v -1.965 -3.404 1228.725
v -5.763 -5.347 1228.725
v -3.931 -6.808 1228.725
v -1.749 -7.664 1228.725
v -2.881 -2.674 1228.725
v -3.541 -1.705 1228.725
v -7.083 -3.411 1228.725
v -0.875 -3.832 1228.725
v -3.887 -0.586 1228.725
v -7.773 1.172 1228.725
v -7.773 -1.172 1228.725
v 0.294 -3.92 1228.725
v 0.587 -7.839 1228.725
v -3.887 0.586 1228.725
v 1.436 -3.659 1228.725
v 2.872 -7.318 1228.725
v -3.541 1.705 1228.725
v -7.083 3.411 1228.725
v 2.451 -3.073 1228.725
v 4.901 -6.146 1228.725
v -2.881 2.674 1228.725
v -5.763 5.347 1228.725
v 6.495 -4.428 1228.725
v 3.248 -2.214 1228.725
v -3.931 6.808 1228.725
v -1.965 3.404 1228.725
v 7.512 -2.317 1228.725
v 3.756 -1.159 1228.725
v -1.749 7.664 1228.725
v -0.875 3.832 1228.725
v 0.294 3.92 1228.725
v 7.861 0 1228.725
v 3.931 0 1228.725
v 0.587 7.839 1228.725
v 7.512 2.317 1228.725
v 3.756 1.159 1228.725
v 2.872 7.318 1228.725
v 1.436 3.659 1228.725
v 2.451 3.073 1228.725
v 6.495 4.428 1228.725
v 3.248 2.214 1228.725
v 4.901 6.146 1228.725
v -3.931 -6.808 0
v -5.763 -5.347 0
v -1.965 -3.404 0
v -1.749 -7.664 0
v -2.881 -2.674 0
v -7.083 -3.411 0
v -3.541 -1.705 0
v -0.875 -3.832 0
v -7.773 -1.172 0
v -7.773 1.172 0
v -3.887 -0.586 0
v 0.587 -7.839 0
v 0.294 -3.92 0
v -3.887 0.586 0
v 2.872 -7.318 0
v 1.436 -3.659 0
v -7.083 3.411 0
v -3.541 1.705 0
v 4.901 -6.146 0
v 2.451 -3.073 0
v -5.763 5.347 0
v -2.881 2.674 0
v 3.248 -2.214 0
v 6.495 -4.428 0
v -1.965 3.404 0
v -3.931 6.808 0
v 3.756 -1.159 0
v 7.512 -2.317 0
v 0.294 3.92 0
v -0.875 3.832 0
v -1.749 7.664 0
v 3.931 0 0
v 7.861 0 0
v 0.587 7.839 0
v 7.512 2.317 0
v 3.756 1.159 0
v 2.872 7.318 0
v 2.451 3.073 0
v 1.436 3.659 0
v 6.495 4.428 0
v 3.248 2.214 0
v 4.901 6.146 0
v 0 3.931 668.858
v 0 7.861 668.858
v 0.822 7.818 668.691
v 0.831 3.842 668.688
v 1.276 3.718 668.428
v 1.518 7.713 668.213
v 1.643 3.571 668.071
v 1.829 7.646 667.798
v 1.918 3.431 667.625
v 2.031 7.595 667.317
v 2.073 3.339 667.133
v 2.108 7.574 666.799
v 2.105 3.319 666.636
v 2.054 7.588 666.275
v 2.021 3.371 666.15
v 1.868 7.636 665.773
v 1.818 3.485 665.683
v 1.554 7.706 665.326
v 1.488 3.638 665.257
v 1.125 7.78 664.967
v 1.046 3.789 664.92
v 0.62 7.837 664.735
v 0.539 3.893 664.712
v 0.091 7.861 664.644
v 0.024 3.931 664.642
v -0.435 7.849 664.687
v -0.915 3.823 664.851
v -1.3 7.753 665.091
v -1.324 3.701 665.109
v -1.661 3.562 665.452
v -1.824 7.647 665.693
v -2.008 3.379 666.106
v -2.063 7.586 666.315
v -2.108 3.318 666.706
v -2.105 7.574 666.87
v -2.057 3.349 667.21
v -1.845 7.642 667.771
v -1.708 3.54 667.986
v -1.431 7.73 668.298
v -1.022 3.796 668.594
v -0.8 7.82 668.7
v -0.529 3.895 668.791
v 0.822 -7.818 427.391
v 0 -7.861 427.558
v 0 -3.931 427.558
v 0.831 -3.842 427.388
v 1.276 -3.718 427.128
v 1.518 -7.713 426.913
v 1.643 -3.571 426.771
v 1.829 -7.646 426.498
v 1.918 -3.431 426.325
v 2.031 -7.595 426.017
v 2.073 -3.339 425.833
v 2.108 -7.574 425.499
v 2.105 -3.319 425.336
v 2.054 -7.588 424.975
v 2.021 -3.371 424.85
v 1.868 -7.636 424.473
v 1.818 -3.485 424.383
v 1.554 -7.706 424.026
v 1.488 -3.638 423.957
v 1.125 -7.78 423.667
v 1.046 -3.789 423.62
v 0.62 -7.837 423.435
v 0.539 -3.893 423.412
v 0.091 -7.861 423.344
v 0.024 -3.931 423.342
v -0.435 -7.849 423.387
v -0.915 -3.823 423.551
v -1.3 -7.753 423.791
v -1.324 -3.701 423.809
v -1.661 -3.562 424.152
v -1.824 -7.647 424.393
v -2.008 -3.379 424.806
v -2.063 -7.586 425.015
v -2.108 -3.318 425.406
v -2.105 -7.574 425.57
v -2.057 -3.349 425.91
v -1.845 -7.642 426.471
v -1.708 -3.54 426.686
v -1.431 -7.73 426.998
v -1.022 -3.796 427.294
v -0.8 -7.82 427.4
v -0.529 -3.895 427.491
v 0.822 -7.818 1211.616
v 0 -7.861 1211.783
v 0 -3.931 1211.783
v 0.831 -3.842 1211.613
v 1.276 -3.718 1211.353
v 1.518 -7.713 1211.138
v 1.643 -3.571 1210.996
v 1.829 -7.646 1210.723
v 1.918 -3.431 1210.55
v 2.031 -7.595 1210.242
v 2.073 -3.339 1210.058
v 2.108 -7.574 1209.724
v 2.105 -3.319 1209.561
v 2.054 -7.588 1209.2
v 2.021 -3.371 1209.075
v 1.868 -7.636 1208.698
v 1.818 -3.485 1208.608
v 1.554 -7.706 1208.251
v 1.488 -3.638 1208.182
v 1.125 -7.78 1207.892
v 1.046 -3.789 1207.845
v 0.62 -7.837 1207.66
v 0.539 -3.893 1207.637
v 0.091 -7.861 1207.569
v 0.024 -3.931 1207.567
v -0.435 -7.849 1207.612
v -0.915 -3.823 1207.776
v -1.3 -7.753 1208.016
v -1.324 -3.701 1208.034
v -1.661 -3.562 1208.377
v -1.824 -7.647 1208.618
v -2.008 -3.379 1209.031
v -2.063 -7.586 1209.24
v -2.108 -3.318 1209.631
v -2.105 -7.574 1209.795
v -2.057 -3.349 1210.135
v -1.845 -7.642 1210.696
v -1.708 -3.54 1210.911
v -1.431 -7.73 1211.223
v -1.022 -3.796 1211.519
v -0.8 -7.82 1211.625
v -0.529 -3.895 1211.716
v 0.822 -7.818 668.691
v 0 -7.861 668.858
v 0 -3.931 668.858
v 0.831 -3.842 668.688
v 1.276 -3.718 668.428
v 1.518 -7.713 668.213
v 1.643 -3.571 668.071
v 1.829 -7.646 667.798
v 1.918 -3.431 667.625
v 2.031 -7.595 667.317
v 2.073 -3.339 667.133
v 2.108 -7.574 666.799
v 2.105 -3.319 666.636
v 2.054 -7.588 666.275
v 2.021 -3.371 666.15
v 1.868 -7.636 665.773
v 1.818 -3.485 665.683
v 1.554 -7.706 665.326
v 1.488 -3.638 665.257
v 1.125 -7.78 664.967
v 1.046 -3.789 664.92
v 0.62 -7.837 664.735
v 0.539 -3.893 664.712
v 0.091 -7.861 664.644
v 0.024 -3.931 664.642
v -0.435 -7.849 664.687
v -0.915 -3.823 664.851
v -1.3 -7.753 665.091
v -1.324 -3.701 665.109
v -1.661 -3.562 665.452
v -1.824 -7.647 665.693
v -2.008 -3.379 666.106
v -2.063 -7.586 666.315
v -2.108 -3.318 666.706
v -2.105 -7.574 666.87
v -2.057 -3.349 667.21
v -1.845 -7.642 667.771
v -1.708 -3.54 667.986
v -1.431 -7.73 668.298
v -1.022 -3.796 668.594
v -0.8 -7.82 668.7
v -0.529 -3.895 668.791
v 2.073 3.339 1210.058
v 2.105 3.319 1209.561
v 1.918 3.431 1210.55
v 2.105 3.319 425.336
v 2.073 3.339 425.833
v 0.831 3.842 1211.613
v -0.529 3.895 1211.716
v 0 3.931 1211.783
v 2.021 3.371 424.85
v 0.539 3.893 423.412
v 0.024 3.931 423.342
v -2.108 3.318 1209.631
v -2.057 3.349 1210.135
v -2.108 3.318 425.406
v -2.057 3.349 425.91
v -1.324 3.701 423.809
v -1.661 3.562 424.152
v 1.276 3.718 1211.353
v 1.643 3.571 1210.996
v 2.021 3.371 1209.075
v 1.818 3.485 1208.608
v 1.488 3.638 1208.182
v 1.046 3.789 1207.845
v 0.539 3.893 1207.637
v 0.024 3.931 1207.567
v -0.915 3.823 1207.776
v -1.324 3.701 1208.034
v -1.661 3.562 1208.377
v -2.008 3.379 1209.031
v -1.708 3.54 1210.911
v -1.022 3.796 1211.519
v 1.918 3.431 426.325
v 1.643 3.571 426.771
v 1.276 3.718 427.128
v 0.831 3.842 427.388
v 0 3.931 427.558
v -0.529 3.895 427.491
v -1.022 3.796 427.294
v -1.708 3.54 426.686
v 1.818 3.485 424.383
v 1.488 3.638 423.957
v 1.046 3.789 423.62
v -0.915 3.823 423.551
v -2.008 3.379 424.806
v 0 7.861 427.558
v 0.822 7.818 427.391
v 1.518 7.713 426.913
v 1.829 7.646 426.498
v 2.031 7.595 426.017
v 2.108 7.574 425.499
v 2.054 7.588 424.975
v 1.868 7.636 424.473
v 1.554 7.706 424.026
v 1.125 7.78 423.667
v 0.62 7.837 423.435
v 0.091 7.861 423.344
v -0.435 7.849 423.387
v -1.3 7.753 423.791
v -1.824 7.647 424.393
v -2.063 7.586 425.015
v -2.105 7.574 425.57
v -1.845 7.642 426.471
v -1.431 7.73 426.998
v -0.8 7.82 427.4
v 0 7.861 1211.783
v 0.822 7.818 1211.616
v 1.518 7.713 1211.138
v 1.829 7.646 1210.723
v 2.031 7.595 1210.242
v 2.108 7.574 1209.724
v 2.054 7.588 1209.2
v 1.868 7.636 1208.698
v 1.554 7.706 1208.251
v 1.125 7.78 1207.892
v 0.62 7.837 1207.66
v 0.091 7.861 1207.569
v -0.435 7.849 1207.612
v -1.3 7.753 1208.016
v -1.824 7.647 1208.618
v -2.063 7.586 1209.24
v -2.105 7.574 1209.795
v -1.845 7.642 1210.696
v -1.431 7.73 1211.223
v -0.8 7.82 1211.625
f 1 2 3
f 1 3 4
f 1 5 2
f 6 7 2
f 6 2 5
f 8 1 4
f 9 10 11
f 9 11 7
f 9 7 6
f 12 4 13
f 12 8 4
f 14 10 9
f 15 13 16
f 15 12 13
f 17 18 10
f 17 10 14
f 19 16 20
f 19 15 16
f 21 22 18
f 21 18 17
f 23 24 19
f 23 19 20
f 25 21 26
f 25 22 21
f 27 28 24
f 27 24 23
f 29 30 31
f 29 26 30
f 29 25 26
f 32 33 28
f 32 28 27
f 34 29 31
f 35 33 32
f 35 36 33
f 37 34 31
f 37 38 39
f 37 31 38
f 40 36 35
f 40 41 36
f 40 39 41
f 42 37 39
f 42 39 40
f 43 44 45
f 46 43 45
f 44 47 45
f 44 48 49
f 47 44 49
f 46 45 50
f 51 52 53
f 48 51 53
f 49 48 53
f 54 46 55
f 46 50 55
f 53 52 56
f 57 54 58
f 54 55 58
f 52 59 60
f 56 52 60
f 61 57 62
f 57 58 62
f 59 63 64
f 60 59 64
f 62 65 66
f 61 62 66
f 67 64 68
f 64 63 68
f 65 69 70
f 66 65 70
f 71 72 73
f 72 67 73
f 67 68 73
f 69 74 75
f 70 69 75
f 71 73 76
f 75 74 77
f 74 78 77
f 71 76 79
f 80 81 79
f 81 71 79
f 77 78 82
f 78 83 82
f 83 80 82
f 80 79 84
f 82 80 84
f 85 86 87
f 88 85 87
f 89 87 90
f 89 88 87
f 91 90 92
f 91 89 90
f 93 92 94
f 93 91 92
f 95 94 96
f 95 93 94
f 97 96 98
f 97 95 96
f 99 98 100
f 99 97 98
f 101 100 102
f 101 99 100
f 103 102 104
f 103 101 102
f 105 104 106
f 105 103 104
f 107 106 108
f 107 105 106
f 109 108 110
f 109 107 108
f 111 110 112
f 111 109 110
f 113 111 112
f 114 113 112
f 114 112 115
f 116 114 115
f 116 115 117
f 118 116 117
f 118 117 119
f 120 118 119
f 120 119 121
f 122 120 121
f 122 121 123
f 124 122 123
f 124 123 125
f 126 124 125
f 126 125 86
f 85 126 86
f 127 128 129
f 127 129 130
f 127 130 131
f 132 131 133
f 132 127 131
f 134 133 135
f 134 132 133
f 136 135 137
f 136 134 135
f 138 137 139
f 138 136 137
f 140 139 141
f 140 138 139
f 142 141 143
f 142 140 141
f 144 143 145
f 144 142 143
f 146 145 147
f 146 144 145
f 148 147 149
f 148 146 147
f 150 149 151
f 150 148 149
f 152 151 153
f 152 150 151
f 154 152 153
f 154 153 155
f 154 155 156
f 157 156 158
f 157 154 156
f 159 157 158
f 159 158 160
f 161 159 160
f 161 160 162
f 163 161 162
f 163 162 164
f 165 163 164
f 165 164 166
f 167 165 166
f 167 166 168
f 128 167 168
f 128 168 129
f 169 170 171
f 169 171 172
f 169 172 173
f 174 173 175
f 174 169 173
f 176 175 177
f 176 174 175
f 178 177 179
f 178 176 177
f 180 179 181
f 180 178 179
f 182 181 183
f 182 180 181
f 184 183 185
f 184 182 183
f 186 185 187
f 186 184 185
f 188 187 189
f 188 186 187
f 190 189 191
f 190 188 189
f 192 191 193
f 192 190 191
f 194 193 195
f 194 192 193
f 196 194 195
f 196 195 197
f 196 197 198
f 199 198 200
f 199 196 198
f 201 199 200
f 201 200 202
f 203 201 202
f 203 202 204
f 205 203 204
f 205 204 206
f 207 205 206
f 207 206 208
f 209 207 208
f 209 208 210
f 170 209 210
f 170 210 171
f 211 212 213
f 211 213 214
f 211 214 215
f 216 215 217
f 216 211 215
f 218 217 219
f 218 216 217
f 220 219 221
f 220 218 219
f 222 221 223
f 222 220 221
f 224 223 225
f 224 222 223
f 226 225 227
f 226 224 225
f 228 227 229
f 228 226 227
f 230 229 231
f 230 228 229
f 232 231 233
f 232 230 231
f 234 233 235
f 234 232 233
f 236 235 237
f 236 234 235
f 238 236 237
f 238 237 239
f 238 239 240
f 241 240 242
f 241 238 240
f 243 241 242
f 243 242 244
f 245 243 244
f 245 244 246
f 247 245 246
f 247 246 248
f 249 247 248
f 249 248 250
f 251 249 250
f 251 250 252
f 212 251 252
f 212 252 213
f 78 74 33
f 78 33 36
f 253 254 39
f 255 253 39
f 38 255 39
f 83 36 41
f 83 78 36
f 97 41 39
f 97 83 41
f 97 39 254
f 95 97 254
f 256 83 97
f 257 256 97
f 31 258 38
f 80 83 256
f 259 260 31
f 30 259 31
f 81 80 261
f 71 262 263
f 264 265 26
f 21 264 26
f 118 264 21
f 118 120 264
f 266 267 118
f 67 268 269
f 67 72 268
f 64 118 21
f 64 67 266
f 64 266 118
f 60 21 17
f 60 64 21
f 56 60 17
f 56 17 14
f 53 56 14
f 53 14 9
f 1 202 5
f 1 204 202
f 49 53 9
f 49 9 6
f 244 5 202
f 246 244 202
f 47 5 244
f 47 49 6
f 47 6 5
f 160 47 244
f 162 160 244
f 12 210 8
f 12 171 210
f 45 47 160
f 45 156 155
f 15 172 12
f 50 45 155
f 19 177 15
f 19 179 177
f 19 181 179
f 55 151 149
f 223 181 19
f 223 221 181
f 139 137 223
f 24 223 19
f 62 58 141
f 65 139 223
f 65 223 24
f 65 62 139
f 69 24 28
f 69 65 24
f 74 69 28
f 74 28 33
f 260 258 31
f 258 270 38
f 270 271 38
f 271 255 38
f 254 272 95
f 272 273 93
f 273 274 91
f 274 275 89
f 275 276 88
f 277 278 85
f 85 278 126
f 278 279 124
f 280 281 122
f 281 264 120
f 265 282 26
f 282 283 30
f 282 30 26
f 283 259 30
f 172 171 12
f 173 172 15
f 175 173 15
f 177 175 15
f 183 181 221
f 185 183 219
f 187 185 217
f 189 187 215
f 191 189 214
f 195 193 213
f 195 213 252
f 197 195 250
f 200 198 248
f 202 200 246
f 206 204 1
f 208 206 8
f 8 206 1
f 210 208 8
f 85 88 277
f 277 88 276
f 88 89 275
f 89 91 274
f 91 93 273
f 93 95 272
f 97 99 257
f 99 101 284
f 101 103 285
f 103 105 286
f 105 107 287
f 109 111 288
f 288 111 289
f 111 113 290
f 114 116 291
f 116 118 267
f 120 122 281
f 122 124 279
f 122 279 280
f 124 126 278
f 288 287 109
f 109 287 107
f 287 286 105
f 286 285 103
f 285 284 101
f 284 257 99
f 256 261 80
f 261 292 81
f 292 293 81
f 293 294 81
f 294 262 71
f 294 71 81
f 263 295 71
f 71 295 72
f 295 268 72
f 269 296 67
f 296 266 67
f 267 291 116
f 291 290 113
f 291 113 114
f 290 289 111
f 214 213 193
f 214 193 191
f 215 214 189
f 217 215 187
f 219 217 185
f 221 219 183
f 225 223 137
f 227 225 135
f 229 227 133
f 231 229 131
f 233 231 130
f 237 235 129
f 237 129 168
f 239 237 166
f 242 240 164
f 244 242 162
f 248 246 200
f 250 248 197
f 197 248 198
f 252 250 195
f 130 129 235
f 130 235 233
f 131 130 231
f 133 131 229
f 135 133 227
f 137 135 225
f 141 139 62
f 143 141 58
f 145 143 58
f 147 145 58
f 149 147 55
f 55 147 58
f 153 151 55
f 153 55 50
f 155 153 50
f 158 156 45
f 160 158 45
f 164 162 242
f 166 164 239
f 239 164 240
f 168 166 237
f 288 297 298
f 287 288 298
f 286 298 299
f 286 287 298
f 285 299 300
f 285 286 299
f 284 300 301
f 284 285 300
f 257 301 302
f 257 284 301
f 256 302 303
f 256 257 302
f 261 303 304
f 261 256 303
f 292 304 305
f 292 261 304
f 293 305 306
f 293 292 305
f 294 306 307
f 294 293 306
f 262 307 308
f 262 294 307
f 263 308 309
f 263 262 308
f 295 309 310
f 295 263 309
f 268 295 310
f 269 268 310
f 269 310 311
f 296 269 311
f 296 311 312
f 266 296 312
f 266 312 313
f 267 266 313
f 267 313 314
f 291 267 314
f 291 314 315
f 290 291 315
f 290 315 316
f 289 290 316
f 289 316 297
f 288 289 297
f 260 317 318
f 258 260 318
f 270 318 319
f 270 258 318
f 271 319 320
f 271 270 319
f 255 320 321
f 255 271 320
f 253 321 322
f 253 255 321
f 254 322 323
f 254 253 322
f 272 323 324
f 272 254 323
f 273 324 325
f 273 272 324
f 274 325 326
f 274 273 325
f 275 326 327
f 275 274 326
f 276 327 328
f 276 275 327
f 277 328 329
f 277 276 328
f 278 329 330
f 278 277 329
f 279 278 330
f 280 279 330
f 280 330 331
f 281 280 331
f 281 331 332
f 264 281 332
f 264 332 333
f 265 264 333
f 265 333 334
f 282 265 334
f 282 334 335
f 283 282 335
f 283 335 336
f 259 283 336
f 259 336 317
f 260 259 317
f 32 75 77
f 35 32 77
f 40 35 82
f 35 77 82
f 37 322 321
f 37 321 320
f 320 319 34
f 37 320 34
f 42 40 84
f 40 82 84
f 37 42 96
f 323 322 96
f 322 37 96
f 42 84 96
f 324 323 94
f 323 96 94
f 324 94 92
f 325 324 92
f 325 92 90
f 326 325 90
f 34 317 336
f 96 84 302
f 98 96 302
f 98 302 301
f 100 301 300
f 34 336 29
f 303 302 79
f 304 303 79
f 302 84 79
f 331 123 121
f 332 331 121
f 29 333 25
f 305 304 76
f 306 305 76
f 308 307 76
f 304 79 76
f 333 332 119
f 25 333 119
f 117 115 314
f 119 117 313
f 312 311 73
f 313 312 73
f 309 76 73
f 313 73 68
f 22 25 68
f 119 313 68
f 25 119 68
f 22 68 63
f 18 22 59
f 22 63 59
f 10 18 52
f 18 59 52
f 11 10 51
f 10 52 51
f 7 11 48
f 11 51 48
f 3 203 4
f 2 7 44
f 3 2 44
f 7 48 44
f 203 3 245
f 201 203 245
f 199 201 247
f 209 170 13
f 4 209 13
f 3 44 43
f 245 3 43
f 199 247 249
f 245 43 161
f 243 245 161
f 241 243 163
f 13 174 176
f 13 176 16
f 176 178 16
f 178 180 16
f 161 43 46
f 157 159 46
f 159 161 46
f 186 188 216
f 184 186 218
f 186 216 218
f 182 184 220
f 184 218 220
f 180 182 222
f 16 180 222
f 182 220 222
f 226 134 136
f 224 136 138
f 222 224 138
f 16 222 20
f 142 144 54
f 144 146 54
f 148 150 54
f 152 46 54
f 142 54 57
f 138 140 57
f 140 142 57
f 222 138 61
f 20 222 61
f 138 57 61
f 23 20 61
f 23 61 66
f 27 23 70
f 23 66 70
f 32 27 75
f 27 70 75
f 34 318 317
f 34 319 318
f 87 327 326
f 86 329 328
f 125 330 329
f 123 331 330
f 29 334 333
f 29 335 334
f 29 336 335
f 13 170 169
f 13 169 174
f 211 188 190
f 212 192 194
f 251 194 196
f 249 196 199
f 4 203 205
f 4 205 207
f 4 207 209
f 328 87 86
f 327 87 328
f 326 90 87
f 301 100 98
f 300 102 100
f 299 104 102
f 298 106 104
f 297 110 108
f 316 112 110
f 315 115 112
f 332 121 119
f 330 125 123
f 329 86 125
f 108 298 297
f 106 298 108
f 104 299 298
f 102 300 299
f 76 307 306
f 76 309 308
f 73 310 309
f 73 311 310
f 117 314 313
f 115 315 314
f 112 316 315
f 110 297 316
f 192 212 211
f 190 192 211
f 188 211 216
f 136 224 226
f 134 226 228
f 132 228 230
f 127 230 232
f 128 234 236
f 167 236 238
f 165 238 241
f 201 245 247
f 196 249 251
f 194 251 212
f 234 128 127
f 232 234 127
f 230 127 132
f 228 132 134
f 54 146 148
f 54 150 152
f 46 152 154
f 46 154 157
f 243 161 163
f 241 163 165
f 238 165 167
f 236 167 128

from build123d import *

# Parameters (mm, degrees)
SKETCH1_R        = 7.8613
SKETCH1_R_2      = 3.93065
ROD_DEPTH        = 1228.725
HOLES_DEPTH      = 1229.77529504
HOLES_DEPTH_BACK = 1229.77529504
SKETCH3_R        = 2.1082


with BuildPart() as part:
    # Sketch1 → Rod (new body)
    with BuildSketch(Plane.XY):
        Circle(SKETCH1_R)
        Circle(SKETCH1_R_2, mode=Mode.SUBTRACT)
    extrude(amount=ROD_DEPTH)

    # Sketch3 → Holes (cut, two sides: drawn at the far end of the back side and taken through both)
    with BuildSketch(Plane(origin=(0, 0, 0), x_dir=(1, 0, 0), z_dir=(0, 1, 0)).offset(-HOLES_DEPTH_BACK)):
        with Locations(Location((0, -425.45, 0), (0, 0, 270))):
            Circle(SKETCH3_R)
        with Locations(Location((0, -666.75, 0), (0, 0, 270))):
            Circle(SKETCH3_R)
        with Locations(Location((0, -1209.675, 0), (0, 0, 270))):
            Circle(SKETCH3_R)
    extrude(amount=HOLES_DEPTH + HOLES_DEPTH_BACK, mode=Mode.SUBTRACT)


solid = part.part
